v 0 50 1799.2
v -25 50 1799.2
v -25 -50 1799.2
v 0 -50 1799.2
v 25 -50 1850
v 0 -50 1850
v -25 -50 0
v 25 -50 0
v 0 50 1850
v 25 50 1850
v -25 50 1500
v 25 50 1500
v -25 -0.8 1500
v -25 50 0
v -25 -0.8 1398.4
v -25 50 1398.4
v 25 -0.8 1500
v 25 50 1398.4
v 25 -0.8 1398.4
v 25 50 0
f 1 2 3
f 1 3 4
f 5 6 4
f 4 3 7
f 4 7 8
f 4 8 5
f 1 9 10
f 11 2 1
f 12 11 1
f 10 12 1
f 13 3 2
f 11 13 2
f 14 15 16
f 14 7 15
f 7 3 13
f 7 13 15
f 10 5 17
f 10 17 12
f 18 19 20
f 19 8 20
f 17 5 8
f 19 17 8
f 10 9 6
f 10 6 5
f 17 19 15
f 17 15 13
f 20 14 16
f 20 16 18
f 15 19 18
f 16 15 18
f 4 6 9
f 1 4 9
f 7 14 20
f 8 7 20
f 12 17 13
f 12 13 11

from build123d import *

# Parameters (mm, degrees)
F0_W     = 50
F0_H     = 100
F1_DEPTH = 1850
F2_W     = 50.8
F2_H     = 101.6
F3_DEPTH = 50
F4_W     = 25
F4_H     = 100
F5_DEPTH = 50.8


# Not quite as in the source:
# - a feature names something its author has since deleted; it is built from what else it names


with BuildPart() as f1:
    # F0 (on Top) → F1 (new body)
    with BuildSketch(Plane.XY):
        Rectangle(F0_W, F0_H)
    extrude(amount=F1_DEPTH)

    # F2 (on Right) → F3 (cut, symmetric)
    with BuildSketch(Plane.YZ):
        with Locations((24.6, 1449.2)):
            Rectangle(F2_W, F2_H)
    extrude(amount=F3_DEPTH, both=True, mode=Mode.SUBTRACT)

    # F4 (on face) → F5 (cut)
    with BuildSketch(Plane.XY.offset(1850)):
        with Locations((-12.5, 0)):
            Rectangle(F4_W, F4_H)
    extrude(amount=-F5_DEPTH, mode=Mode.SUBTRACT)


solid = f1.part
